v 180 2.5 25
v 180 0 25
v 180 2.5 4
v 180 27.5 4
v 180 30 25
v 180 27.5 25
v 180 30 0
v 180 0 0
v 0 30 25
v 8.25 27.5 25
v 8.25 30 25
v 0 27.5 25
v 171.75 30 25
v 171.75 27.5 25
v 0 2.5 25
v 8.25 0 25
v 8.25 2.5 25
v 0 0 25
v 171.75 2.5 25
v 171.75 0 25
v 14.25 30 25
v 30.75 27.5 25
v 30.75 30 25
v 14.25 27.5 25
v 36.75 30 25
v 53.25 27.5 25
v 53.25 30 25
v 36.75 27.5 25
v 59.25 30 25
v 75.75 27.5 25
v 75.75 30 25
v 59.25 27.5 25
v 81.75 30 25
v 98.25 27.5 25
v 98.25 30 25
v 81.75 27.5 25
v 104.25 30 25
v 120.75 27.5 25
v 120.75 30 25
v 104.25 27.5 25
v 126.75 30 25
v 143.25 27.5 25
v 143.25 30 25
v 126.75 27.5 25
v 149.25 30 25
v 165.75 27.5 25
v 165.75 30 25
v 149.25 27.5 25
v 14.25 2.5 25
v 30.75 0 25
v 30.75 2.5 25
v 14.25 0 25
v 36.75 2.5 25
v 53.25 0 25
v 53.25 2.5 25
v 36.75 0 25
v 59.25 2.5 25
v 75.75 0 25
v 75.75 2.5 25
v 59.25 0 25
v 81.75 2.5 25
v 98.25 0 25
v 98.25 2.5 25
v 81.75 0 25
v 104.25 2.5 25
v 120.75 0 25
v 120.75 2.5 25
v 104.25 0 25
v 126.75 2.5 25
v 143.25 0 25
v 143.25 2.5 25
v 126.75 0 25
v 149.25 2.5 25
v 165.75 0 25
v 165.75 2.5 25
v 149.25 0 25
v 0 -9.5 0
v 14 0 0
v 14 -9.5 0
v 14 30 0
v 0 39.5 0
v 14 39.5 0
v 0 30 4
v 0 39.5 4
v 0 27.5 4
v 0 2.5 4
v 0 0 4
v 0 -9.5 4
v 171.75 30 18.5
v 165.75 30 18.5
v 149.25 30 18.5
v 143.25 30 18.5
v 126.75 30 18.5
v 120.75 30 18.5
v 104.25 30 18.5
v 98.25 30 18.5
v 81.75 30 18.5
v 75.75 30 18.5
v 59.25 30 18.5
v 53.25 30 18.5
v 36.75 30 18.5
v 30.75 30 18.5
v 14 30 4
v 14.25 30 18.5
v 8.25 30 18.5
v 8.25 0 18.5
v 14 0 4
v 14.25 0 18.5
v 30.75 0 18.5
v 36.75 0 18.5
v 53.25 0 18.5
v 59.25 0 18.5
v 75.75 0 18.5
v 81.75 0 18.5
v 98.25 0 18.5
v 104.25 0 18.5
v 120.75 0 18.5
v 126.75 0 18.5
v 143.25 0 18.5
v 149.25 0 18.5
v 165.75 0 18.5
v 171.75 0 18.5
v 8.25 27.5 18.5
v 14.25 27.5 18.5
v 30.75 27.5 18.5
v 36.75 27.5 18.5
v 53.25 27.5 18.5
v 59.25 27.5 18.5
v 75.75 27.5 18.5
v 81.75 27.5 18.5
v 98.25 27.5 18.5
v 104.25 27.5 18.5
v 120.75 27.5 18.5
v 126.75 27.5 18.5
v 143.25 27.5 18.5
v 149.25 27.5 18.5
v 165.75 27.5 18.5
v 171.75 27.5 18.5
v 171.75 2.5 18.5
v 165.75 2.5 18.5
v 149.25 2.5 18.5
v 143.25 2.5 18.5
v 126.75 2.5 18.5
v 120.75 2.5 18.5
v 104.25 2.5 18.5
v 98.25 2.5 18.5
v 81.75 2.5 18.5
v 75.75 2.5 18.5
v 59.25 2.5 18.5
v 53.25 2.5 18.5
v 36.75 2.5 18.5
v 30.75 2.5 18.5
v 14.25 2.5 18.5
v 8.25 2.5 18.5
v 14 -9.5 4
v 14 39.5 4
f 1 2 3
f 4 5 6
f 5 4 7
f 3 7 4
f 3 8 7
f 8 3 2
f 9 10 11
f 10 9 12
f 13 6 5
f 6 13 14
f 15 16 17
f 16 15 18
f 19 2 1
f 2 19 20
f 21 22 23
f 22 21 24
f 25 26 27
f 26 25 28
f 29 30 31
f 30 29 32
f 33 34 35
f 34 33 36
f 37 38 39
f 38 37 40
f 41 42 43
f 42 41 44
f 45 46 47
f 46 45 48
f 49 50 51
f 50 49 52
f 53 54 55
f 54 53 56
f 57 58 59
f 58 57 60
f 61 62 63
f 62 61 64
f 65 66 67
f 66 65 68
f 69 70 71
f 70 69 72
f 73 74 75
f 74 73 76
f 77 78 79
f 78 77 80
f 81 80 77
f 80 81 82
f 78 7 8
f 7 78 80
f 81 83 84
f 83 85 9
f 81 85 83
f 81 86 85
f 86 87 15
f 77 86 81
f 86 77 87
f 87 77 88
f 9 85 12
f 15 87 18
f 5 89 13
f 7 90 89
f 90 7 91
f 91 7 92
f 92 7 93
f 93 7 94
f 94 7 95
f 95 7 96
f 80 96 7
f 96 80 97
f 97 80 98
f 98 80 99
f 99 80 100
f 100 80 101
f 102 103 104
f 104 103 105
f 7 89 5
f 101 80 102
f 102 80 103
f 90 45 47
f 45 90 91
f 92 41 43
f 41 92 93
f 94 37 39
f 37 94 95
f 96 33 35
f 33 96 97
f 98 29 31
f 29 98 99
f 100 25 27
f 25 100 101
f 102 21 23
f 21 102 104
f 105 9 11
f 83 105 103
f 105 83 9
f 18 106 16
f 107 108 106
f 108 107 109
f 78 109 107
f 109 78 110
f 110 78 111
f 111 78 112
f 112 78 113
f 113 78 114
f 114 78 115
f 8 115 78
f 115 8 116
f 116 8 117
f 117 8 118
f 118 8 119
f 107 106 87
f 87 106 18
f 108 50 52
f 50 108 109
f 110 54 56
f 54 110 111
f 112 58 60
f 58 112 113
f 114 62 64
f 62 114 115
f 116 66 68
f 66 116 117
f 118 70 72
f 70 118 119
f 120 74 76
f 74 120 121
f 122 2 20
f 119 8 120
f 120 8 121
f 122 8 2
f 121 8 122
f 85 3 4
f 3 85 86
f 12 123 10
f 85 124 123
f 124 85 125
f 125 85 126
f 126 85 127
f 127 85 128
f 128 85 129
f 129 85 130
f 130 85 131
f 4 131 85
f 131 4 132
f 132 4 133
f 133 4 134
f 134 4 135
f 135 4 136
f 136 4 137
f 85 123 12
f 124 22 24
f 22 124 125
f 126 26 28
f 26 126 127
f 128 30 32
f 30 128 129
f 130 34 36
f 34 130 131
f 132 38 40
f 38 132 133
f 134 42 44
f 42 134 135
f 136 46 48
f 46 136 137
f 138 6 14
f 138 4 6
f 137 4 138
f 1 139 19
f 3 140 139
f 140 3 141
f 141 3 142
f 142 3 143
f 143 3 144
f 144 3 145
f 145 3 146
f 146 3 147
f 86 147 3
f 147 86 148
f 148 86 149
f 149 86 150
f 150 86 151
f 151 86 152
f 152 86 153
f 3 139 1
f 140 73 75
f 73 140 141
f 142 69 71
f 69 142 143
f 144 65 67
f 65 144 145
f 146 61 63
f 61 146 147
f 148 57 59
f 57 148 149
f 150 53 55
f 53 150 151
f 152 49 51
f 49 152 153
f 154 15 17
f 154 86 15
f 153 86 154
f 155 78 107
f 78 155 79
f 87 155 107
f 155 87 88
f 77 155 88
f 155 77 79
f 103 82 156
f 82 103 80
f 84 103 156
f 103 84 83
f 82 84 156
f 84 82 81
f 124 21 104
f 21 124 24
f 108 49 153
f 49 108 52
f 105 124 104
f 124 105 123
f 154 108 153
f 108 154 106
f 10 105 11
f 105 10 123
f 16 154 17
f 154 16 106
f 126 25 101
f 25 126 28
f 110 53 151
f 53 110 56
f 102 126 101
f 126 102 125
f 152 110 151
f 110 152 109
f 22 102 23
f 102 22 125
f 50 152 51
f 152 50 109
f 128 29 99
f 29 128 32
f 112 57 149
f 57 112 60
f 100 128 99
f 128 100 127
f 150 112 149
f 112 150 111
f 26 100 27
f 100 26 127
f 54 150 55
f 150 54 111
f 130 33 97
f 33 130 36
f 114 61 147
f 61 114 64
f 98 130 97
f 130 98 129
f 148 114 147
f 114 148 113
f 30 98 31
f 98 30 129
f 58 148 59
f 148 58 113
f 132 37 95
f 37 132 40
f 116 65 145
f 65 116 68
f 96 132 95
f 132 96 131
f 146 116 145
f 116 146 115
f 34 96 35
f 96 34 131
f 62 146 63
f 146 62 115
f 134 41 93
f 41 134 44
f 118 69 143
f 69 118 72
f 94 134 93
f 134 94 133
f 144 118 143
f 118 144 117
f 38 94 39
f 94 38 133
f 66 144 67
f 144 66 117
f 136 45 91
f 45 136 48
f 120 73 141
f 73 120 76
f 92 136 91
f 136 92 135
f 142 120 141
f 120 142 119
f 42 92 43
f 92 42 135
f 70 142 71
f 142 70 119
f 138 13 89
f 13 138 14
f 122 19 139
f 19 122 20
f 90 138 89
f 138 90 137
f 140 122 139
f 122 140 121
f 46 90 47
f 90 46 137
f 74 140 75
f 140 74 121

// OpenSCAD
$fn = 32;

// ----------------------------------------------------------------------
// Cable duct: 180 x 30 x 25 mm, 8 fingers
// ----------------------------------------------------------------------

// --- parameters (mm) ---
tray_len = 180;           // duct length, X
tray_w = 30;              // duct width, Y
tray_h = 25;              // duct height, Z
tray_t = 2.5;             // side wall thickness
floor_t = 4;              // floor thickness
slot_w = 6;               // finger slot width
slot_h = 14.5;            // finger slot height
fingers = 8;              // number of finger slots per side
pitch = 22.5;             // finger pitch
ear_w = 10.5;             // mounting ear width
ear_l = 14;               // mounting ear length

module shell() {
  difference() {
    cube([tray_len, tray_w, tray_h]);
    /* open top channel */
    translate([-tray_t - 1, tray_t, floor_t])
      cube([tray_len + 2 * tray_t + 2, tray_w - 2 * tray_t, tray_h + 1]);
  }
}

module ears() {
  translate([0, -ear_w + 1, 0]) cube([ear_l, ear_w, floor_t]);
  translate([0, tray_w - 1, 0]) cube([ear_l, ear_w, floor_t]);
}

difference() {
  union() {
    shell();
    ears();
  }
  /* finger slots cut through both side walls */
  for (i = [0 : fingers - 1]) translate([pitch / 2 + i * pitch - slot_w / 2, -1, floor_t + slot_h]) cube([slot_w, tray_w + 2, tray_h]);
}
